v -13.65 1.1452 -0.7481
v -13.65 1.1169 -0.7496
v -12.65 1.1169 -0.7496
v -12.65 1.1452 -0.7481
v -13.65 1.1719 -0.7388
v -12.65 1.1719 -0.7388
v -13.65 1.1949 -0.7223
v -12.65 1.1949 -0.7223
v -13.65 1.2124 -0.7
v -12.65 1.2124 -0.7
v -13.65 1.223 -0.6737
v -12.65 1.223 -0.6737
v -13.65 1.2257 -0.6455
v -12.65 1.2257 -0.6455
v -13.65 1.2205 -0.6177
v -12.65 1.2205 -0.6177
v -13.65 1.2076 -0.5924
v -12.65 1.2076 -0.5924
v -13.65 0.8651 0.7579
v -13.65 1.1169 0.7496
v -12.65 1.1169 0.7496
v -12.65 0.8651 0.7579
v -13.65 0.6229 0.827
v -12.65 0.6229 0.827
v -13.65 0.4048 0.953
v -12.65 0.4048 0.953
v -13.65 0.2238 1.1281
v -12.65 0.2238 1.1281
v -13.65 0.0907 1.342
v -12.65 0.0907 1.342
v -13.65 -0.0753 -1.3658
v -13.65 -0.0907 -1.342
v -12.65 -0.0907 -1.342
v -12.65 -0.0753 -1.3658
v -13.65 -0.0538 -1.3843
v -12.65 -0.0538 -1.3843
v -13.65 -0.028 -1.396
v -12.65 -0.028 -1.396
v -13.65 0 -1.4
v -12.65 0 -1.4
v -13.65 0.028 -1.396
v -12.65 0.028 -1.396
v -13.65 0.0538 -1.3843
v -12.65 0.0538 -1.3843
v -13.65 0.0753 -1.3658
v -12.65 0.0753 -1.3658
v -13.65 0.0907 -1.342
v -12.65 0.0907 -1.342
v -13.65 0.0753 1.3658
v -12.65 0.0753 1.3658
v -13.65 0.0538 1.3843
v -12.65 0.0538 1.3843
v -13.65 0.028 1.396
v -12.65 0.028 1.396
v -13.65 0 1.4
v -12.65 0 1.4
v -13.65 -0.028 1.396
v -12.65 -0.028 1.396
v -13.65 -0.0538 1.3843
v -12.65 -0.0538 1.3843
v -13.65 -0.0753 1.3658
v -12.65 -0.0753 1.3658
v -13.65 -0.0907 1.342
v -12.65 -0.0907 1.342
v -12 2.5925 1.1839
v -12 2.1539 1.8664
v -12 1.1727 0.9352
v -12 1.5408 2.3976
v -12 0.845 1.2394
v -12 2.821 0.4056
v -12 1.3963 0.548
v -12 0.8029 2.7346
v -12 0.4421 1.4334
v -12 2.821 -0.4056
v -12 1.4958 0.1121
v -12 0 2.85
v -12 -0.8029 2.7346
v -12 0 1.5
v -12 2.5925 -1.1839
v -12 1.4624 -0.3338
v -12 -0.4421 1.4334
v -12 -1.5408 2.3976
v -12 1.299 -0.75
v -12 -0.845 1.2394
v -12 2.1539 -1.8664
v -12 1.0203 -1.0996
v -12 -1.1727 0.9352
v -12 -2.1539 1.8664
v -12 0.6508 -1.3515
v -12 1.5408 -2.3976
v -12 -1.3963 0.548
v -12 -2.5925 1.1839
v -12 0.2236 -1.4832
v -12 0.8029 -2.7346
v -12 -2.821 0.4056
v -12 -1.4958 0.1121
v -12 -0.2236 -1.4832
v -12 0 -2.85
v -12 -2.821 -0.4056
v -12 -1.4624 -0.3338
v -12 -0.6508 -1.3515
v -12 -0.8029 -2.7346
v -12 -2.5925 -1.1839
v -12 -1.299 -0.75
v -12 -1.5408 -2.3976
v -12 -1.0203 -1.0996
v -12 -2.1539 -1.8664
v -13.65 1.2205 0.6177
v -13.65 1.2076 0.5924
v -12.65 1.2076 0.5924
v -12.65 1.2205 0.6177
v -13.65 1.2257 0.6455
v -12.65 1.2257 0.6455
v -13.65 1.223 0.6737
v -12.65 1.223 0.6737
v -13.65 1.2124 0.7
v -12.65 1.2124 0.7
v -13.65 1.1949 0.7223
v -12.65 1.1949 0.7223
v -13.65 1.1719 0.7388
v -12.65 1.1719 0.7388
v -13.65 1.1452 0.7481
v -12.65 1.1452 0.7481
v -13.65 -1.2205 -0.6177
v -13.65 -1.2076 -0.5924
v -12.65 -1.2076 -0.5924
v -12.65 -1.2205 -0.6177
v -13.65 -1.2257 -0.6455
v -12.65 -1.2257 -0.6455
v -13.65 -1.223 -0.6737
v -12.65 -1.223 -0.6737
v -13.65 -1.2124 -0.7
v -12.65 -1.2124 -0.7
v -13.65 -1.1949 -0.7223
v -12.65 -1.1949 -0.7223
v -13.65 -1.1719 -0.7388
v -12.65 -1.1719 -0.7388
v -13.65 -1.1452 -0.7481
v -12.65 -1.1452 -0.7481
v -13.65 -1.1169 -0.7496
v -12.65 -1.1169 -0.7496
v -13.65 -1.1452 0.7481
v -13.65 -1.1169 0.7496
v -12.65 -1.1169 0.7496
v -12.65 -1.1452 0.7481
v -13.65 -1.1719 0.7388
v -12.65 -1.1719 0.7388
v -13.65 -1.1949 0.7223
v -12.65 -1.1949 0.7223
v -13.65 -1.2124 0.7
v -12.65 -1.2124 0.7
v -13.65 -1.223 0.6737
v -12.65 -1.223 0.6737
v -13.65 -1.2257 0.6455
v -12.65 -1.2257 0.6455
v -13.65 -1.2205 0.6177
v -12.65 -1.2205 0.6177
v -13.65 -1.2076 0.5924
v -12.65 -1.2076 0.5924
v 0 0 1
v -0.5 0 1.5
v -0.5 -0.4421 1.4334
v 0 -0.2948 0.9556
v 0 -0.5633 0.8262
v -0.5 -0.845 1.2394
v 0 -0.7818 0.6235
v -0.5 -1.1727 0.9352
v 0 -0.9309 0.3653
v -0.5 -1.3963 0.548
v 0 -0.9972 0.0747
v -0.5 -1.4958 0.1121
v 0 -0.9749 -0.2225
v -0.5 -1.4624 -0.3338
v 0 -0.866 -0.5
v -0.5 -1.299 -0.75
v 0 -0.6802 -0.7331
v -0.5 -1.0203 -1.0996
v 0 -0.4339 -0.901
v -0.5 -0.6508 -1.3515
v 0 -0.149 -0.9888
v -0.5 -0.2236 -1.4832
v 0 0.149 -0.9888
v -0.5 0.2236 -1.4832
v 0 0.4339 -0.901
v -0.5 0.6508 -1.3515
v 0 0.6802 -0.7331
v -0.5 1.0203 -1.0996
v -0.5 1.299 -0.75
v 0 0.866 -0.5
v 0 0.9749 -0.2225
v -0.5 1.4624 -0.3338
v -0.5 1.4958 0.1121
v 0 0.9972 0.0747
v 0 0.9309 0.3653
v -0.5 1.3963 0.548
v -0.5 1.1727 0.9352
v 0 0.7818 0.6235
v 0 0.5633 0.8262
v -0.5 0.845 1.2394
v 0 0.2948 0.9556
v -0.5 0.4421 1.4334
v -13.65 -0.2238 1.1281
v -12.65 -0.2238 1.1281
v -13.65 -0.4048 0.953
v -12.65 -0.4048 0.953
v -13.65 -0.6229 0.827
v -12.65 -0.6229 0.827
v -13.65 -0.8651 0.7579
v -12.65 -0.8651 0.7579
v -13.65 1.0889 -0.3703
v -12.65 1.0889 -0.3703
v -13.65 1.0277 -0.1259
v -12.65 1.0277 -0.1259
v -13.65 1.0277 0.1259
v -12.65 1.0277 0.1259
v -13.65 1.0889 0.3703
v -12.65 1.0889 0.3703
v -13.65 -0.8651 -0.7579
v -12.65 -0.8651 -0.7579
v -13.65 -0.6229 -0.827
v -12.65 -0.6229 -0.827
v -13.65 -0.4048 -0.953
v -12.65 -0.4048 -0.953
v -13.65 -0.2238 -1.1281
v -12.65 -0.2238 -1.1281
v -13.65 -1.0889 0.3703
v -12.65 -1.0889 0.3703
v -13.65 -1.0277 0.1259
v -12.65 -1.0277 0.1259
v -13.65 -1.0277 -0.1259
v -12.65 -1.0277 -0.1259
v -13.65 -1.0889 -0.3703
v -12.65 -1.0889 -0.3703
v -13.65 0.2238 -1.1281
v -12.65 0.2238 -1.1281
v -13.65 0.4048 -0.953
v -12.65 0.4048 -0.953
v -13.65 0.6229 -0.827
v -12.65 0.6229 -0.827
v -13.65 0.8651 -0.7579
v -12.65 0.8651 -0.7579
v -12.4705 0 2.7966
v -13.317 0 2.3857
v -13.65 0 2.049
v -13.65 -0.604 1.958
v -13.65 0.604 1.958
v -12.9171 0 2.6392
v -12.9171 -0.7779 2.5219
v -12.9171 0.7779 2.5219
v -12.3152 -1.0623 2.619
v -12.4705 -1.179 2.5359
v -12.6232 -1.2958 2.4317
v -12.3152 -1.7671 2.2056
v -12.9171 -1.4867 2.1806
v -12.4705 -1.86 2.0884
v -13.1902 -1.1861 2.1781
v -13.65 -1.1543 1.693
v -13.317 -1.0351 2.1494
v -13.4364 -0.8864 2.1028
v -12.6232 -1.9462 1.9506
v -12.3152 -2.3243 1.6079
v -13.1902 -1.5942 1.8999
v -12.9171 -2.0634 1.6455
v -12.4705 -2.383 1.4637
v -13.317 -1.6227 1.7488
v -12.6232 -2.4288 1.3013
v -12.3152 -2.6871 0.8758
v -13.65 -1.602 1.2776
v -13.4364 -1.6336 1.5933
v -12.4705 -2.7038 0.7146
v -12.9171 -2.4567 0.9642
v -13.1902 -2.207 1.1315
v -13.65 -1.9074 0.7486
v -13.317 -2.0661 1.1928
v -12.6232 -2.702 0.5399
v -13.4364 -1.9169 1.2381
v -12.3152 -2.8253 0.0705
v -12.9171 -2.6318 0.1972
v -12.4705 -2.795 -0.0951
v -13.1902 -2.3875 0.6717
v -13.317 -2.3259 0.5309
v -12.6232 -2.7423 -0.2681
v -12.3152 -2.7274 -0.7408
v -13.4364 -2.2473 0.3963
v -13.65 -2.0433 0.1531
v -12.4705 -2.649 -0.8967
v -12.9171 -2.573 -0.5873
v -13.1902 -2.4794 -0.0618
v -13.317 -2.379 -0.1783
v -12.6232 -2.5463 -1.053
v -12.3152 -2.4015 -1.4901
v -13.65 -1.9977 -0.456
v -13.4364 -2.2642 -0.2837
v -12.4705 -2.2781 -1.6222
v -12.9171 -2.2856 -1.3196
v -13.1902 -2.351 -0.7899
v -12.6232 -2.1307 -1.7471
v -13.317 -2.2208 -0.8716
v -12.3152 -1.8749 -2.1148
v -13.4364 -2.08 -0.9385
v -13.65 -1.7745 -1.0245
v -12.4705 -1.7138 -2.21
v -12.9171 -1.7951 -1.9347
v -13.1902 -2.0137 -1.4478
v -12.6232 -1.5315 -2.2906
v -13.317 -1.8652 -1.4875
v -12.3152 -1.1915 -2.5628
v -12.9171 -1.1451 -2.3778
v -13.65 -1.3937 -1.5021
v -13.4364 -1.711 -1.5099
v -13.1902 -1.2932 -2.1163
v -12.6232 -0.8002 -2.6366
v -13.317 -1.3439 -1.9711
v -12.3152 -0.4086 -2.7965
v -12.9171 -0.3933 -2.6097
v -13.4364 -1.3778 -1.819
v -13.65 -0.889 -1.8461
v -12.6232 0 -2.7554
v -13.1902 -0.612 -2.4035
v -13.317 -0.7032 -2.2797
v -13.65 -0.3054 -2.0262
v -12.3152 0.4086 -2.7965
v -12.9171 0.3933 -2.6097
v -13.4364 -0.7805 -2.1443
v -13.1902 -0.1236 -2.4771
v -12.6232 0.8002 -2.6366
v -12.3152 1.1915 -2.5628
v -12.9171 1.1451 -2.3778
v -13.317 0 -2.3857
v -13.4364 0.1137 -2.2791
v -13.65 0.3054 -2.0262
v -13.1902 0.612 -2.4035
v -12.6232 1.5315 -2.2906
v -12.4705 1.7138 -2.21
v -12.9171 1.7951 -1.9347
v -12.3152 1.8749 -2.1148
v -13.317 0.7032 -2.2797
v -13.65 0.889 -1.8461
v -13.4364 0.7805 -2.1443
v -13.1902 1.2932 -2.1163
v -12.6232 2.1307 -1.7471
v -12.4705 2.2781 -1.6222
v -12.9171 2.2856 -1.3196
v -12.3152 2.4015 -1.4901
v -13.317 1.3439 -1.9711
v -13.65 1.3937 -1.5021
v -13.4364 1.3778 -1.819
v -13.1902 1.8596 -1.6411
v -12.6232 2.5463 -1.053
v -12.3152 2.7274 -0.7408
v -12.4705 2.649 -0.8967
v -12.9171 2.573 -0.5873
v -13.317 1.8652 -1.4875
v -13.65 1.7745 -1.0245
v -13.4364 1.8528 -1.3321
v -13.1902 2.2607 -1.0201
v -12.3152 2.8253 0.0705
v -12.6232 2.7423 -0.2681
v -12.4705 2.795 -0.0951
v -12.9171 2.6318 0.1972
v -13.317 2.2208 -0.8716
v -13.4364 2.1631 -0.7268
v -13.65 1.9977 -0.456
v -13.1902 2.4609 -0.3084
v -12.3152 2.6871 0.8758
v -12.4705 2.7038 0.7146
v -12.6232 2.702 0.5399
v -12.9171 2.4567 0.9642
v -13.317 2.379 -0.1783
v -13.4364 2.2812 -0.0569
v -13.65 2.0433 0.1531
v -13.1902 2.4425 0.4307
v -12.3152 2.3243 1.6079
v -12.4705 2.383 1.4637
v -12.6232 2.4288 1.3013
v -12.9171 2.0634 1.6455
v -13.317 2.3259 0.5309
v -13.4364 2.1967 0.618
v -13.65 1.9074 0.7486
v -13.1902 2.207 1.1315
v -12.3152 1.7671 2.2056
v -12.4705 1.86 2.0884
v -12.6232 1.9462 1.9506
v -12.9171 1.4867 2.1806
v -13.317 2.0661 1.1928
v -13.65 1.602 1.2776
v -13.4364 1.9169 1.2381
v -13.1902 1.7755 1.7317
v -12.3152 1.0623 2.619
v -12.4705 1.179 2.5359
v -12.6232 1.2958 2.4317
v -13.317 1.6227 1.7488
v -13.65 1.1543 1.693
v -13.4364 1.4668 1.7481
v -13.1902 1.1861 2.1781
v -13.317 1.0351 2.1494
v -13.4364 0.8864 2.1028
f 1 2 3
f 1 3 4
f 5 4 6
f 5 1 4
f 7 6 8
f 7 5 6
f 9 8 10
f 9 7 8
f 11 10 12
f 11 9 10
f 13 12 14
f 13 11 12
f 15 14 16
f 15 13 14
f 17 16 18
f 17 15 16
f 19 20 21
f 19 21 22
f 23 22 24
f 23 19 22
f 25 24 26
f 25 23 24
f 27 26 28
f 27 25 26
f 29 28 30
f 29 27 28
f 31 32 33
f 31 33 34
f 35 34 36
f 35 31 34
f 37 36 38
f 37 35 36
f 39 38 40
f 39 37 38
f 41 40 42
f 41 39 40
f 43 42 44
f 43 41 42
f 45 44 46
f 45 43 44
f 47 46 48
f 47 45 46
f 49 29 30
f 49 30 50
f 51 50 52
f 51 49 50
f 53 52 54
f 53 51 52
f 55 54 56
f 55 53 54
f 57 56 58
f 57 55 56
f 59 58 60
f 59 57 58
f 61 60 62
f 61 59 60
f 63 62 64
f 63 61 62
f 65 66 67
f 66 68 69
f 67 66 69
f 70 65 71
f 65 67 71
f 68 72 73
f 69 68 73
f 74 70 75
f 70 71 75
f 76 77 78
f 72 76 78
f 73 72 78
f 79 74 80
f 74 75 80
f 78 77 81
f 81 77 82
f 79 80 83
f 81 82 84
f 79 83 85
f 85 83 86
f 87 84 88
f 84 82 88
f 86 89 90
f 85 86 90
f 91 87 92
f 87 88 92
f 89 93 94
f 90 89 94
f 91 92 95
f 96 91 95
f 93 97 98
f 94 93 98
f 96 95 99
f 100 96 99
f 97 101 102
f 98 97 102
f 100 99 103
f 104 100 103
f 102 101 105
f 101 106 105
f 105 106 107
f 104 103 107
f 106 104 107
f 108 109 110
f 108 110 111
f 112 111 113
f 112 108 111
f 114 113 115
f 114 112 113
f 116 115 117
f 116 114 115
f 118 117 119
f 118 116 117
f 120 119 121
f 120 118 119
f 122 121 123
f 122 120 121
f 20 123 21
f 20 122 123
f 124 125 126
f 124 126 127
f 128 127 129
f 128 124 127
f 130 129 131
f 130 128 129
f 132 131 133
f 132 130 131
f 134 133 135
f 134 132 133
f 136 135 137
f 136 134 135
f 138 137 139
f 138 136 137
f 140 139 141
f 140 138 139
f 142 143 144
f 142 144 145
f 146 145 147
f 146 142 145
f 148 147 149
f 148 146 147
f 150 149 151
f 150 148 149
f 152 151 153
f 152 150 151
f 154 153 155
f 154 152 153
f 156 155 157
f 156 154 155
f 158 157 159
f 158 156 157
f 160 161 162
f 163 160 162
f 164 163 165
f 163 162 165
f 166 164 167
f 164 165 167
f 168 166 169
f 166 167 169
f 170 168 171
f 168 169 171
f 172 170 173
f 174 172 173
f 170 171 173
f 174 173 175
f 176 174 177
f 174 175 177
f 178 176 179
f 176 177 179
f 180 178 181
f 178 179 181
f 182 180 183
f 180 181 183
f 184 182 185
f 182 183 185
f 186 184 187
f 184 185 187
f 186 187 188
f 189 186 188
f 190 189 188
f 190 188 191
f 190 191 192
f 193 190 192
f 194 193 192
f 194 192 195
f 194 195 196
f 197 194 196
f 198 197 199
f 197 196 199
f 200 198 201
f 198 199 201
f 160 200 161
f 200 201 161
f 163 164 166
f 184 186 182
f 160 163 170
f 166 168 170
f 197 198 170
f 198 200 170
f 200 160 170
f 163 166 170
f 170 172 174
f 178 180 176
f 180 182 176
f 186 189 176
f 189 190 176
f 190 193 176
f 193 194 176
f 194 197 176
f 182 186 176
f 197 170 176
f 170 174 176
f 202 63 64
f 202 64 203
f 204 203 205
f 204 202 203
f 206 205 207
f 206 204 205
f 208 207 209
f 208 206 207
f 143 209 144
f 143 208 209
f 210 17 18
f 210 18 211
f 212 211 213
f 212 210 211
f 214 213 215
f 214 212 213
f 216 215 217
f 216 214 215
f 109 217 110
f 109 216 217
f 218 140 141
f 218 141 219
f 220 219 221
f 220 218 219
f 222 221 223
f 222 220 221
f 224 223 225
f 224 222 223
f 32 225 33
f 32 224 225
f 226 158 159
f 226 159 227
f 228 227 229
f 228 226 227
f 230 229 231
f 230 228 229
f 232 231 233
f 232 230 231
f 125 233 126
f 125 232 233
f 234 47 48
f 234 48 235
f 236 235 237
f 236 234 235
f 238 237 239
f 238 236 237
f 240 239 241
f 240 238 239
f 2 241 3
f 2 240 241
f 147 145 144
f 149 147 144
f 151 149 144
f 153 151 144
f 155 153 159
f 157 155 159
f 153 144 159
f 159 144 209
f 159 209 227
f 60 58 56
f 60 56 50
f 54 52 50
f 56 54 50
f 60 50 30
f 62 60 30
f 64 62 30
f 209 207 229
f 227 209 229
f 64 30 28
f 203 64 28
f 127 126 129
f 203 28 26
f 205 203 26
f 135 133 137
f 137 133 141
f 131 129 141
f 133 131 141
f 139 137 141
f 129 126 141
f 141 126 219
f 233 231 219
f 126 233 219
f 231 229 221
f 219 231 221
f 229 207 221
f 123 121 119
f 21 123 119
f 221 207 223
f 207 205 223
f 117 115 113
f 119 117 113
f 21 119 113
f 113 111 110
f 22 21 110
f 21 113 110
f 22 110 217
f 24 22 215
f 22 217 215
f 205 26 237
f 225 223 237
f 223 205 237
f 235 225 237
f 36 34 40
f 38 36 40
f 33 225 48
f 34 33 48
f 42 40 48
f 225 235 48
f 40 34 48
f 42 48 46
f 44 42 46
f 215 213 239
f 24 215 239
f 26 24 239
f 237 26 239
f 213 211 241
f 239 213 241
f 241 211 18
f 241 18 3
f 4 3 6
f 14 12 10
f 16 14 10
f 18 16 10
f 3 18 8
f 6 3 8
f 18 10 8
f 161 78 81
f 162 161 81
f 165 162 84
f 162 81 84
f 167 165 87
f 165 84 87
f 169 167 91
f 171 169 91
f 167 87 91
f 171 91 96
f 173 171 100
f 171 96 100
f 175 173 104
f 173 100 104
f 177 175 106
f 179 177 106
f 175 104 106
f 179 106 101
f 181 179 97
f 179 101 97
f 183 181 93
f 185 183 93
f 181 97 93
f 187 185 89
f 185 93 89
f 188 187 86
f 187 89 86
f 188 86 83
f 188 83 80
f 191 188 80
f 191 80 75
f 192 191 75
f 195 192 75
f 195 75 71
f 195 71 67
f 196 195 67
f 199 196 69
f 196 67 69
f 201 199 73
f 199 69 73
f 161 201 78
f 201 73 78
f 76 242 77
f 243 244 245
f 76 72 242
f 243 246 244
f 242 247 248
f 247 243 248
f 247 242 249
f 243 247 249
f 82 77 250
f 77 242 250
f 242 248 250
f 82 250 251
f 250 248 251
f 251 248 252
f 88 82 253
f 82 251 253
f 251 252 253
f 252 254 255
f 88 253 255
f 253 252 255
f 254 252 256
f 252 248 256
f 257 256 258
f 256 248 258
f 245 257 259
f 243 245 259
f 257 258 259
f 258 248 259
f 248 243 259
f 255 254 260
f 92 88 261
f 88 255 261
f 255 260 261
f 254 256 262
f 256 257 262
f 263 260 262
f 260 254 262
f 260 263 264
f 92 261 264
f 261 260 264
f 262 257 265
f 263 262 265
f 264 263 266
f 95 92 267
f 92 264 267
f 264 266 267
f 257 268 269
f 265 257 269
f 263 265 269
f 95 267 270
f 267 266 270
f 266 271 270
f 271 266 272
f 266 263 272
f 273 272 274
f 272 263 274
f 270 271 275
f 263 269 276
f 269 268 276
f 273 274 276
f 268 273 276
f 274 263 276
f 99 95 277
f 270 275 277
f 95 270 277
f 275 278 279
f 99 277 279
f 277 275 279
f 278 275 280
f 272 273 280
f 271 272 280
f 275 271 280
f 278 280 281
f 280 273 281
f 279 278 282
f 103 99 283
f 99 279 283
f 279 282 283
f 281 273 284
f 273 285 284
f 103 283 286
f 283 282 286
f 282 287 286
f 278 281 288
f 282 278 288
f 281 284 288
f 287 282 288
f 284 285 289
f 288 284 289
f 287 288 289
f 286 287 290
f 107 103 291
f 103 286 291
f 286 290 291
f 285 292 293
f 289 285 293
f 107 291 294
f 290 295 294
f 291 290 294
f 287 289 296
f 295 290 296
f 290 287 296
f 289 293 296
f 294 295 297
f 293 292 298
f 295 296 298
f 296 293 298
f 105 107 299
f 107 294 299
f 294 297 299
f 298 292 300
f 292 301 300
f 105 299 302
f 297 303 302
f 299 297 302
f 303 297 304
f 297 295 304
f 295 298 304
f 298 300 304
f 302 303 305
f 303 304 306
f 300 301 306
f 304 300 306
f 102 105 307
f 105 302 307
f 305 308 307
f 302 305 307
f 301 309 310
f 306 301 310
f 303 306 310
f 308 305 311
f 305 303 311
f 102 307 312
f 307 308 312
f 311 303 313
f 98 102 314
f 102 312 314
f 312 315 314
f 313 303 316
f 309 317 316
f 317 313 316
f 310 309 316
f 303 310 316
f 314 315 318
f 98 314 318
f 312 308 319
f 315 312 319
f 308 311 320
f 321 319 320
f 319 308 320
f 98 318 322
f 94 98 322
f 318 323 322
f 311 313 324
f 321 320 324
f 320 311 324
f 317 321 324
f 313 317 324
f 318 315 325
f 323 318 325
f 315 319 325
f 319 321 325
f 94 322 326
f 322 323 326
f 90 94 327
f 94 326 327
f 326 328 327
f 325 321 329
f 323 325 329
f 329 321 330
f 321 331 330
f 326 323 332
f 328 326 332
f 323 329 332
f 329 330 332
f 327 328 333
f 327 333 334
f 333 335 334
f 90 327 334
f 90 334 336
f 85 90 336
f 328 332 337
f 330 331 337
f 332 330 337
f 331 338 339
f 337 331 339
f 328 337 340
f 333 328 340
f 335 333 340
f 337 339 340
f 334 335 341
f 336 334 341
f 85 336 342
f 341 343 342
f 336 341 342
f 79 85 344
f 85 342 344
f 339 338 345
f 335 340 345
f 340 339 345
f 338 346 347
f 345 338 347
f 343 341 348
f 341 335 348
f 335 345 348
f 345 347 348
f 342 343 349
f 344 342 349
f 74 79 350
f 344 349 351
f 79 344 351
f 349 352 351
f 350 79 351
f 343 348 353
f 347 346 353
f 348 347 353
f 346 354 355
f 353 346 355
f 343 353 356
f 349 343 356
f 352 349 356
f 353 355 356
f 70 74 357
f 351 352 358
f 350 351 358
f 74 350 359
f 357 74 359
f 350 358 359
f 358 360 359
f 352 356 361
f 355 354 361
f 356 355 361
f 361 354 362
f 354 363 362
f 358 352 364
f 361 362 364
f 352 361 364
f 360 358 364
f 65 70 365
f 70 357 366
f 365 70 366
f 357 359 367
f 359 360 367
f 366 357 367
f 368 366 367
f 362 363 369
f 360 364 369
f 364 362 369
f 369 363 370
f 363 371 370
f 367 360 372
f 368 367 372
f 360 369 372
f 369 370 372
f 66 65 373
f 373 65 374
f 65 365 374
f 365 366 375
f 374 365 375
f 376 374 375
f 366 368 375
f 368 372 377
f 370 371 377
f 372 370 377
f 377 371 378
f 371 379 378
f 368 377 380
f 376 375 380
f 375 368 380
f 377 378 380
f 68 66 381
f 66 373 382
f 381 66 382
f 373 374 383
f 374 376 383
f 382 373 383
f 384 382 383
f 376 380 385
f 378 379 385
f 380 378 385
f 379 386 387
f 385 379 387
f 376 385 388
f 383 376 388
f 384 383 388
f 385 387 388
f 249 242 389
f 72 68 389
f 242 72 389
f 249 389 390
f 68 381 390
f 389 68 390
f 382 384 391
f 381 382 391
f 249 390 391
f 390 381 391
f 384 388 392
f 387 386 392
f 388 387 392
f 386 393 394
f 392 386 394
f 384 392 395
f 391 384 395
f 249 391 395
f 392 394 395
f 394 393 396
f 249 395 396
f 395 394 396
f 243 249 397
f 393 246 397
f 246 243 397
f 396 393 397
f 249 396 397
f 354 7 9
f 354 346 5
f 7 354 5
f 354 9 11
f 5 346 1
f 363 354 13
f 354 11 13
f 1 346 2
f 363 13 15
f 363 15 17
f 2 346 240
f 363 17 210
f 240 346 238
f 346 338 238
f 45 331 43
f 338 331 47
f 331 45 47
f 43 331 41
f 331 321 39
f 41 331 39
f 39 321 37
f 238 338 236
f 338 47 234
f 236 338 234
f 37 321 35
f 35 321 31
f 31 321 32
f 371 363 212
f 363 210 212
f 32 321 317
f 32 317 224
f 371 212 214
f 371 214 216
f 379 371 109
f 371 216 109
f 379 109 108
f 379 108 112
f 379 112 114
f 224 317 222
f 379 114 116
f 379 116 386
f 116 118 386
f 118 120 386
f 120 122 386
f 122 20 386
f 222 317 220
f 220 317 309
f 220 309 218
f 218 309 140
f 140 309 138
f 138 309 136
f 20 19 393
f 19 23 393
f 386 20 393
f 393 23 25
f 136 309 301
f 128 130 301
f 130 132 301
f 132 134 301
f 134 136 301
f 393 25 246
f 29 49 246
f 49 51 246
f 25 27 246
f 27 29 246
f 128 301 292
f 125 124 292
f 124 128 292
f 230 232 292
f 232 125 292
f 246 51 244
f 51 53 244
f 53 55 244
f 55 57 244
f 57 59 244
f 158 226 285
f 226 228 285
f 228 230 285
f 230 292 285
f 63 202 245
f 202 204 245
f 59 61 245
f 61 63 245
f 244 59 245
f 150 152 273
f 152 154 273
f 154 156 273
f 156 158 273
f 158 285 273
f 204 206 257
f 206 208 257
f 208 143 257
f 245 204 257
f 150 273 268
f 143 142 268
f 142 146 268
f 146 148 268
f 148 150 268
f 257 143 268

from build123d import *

# Parameters (mm, degrees)
CHAMFER1_SIZE      = 0.5
CUT_EXTRUDE1_DEPTH = 1


with BuildPart() as part:
    # Sketch2 → Revolve1 (revolve)
    with BuildSketch(Plane(origin=(0, 0, 0), x_dir=(1, 0, 0), z_dir=(0, 1, 0)), mode=Mode.PRIVATE) as revolve1_sk:
        with BuildLine():
            Line((0, 0), (0, 1.5))
            Line((0, 1.5), (-12, 1.5))
            Line((-12, 1.5), (-12, 2.85))
            ThreePointArc((-12, 2.85), (-12.917065968, 2.639177072), (-13.65, 2.049038106))
            Line((-13.65, 2.049038106), (-13.65, 0))
            Line((-13.65, 0), (0, 0))
        make_face()
    revolve(revolve1_sk.sketch.rotate(Axis((-13.65, 0, 0), (1, 0, 0)), 180), axis=Axis((-13.65, 0, 0), (1, 0, 0)))

    # Chamfer1
    chamfer1_edges = [part.edges().sort_by_distance(p)[0] for p in [
        (0, 0, -1.5),
    ]]
    chamfer(chamfer1_edges, length=CHAMFER1_SIZE)

    # Sketch4 → Cut-Extrude1 (cut)
    with BuildSketch(Plane.ZY.offset(13.65)):
        with BuildLine():
            ThreePointArc((-1.342027284, 0.090739778), (-0.883315009, 0.509982158), (-0.749596595, 1.116859832))
            ThreePointArc((-0.749596595, 1.116859832), (-0.7, 1.212435565), (-0.592430689, 1.20759961))
            ThreePointArc((-0.592430689, 1.20759961), (0, 1.019964317), (0.592430689, 1.20759961))
            ThreePointArc((0.592430689, 1.20759961), (0.7, 1.212435565), (0.749596595, 1.116859832))
            ThreePointArc((0.749596595, 1.116859832), (0.883315009, 0.509982158), (1.342027284, 0.090739778))
            ThreePointArc((1.342027284, 0.090739778), (1.4, 0), (1.342027284, -0.090739778))
            ThreePointArc((1.342027284, -0.090739778), (0.883315009, -0.509982158), (0.749596595, -1.116859832))
            ThreePointArc((0.749596595, -1.116859832), (0.7, -1.212435565), (0.592430689, -1.20759961))
            ThreePointArc((0.592430689, -1.20759961), (0, -1.019964317), (-0.592430689, -1.20759961))
            ThreePointArc((-0.592430689, -1.20759961), (-0.7, -1.212435565), (-0.749596595, -1.116859832))
            ThreePointArc((-0.749596595, -1.116859832), (-0.883315009, -0.509982158), (-1.342027284, -0.090739778))
            ThreePointArc((-1.342027284, -0.090739778), (-1.4, 0), (-1.342027284, 0.090739778))
        make_face()
    extrude(amount=-CUT_EXTRUDE1_DEPTH, mode=Mode.SUBTRACT)


solid = part.part
